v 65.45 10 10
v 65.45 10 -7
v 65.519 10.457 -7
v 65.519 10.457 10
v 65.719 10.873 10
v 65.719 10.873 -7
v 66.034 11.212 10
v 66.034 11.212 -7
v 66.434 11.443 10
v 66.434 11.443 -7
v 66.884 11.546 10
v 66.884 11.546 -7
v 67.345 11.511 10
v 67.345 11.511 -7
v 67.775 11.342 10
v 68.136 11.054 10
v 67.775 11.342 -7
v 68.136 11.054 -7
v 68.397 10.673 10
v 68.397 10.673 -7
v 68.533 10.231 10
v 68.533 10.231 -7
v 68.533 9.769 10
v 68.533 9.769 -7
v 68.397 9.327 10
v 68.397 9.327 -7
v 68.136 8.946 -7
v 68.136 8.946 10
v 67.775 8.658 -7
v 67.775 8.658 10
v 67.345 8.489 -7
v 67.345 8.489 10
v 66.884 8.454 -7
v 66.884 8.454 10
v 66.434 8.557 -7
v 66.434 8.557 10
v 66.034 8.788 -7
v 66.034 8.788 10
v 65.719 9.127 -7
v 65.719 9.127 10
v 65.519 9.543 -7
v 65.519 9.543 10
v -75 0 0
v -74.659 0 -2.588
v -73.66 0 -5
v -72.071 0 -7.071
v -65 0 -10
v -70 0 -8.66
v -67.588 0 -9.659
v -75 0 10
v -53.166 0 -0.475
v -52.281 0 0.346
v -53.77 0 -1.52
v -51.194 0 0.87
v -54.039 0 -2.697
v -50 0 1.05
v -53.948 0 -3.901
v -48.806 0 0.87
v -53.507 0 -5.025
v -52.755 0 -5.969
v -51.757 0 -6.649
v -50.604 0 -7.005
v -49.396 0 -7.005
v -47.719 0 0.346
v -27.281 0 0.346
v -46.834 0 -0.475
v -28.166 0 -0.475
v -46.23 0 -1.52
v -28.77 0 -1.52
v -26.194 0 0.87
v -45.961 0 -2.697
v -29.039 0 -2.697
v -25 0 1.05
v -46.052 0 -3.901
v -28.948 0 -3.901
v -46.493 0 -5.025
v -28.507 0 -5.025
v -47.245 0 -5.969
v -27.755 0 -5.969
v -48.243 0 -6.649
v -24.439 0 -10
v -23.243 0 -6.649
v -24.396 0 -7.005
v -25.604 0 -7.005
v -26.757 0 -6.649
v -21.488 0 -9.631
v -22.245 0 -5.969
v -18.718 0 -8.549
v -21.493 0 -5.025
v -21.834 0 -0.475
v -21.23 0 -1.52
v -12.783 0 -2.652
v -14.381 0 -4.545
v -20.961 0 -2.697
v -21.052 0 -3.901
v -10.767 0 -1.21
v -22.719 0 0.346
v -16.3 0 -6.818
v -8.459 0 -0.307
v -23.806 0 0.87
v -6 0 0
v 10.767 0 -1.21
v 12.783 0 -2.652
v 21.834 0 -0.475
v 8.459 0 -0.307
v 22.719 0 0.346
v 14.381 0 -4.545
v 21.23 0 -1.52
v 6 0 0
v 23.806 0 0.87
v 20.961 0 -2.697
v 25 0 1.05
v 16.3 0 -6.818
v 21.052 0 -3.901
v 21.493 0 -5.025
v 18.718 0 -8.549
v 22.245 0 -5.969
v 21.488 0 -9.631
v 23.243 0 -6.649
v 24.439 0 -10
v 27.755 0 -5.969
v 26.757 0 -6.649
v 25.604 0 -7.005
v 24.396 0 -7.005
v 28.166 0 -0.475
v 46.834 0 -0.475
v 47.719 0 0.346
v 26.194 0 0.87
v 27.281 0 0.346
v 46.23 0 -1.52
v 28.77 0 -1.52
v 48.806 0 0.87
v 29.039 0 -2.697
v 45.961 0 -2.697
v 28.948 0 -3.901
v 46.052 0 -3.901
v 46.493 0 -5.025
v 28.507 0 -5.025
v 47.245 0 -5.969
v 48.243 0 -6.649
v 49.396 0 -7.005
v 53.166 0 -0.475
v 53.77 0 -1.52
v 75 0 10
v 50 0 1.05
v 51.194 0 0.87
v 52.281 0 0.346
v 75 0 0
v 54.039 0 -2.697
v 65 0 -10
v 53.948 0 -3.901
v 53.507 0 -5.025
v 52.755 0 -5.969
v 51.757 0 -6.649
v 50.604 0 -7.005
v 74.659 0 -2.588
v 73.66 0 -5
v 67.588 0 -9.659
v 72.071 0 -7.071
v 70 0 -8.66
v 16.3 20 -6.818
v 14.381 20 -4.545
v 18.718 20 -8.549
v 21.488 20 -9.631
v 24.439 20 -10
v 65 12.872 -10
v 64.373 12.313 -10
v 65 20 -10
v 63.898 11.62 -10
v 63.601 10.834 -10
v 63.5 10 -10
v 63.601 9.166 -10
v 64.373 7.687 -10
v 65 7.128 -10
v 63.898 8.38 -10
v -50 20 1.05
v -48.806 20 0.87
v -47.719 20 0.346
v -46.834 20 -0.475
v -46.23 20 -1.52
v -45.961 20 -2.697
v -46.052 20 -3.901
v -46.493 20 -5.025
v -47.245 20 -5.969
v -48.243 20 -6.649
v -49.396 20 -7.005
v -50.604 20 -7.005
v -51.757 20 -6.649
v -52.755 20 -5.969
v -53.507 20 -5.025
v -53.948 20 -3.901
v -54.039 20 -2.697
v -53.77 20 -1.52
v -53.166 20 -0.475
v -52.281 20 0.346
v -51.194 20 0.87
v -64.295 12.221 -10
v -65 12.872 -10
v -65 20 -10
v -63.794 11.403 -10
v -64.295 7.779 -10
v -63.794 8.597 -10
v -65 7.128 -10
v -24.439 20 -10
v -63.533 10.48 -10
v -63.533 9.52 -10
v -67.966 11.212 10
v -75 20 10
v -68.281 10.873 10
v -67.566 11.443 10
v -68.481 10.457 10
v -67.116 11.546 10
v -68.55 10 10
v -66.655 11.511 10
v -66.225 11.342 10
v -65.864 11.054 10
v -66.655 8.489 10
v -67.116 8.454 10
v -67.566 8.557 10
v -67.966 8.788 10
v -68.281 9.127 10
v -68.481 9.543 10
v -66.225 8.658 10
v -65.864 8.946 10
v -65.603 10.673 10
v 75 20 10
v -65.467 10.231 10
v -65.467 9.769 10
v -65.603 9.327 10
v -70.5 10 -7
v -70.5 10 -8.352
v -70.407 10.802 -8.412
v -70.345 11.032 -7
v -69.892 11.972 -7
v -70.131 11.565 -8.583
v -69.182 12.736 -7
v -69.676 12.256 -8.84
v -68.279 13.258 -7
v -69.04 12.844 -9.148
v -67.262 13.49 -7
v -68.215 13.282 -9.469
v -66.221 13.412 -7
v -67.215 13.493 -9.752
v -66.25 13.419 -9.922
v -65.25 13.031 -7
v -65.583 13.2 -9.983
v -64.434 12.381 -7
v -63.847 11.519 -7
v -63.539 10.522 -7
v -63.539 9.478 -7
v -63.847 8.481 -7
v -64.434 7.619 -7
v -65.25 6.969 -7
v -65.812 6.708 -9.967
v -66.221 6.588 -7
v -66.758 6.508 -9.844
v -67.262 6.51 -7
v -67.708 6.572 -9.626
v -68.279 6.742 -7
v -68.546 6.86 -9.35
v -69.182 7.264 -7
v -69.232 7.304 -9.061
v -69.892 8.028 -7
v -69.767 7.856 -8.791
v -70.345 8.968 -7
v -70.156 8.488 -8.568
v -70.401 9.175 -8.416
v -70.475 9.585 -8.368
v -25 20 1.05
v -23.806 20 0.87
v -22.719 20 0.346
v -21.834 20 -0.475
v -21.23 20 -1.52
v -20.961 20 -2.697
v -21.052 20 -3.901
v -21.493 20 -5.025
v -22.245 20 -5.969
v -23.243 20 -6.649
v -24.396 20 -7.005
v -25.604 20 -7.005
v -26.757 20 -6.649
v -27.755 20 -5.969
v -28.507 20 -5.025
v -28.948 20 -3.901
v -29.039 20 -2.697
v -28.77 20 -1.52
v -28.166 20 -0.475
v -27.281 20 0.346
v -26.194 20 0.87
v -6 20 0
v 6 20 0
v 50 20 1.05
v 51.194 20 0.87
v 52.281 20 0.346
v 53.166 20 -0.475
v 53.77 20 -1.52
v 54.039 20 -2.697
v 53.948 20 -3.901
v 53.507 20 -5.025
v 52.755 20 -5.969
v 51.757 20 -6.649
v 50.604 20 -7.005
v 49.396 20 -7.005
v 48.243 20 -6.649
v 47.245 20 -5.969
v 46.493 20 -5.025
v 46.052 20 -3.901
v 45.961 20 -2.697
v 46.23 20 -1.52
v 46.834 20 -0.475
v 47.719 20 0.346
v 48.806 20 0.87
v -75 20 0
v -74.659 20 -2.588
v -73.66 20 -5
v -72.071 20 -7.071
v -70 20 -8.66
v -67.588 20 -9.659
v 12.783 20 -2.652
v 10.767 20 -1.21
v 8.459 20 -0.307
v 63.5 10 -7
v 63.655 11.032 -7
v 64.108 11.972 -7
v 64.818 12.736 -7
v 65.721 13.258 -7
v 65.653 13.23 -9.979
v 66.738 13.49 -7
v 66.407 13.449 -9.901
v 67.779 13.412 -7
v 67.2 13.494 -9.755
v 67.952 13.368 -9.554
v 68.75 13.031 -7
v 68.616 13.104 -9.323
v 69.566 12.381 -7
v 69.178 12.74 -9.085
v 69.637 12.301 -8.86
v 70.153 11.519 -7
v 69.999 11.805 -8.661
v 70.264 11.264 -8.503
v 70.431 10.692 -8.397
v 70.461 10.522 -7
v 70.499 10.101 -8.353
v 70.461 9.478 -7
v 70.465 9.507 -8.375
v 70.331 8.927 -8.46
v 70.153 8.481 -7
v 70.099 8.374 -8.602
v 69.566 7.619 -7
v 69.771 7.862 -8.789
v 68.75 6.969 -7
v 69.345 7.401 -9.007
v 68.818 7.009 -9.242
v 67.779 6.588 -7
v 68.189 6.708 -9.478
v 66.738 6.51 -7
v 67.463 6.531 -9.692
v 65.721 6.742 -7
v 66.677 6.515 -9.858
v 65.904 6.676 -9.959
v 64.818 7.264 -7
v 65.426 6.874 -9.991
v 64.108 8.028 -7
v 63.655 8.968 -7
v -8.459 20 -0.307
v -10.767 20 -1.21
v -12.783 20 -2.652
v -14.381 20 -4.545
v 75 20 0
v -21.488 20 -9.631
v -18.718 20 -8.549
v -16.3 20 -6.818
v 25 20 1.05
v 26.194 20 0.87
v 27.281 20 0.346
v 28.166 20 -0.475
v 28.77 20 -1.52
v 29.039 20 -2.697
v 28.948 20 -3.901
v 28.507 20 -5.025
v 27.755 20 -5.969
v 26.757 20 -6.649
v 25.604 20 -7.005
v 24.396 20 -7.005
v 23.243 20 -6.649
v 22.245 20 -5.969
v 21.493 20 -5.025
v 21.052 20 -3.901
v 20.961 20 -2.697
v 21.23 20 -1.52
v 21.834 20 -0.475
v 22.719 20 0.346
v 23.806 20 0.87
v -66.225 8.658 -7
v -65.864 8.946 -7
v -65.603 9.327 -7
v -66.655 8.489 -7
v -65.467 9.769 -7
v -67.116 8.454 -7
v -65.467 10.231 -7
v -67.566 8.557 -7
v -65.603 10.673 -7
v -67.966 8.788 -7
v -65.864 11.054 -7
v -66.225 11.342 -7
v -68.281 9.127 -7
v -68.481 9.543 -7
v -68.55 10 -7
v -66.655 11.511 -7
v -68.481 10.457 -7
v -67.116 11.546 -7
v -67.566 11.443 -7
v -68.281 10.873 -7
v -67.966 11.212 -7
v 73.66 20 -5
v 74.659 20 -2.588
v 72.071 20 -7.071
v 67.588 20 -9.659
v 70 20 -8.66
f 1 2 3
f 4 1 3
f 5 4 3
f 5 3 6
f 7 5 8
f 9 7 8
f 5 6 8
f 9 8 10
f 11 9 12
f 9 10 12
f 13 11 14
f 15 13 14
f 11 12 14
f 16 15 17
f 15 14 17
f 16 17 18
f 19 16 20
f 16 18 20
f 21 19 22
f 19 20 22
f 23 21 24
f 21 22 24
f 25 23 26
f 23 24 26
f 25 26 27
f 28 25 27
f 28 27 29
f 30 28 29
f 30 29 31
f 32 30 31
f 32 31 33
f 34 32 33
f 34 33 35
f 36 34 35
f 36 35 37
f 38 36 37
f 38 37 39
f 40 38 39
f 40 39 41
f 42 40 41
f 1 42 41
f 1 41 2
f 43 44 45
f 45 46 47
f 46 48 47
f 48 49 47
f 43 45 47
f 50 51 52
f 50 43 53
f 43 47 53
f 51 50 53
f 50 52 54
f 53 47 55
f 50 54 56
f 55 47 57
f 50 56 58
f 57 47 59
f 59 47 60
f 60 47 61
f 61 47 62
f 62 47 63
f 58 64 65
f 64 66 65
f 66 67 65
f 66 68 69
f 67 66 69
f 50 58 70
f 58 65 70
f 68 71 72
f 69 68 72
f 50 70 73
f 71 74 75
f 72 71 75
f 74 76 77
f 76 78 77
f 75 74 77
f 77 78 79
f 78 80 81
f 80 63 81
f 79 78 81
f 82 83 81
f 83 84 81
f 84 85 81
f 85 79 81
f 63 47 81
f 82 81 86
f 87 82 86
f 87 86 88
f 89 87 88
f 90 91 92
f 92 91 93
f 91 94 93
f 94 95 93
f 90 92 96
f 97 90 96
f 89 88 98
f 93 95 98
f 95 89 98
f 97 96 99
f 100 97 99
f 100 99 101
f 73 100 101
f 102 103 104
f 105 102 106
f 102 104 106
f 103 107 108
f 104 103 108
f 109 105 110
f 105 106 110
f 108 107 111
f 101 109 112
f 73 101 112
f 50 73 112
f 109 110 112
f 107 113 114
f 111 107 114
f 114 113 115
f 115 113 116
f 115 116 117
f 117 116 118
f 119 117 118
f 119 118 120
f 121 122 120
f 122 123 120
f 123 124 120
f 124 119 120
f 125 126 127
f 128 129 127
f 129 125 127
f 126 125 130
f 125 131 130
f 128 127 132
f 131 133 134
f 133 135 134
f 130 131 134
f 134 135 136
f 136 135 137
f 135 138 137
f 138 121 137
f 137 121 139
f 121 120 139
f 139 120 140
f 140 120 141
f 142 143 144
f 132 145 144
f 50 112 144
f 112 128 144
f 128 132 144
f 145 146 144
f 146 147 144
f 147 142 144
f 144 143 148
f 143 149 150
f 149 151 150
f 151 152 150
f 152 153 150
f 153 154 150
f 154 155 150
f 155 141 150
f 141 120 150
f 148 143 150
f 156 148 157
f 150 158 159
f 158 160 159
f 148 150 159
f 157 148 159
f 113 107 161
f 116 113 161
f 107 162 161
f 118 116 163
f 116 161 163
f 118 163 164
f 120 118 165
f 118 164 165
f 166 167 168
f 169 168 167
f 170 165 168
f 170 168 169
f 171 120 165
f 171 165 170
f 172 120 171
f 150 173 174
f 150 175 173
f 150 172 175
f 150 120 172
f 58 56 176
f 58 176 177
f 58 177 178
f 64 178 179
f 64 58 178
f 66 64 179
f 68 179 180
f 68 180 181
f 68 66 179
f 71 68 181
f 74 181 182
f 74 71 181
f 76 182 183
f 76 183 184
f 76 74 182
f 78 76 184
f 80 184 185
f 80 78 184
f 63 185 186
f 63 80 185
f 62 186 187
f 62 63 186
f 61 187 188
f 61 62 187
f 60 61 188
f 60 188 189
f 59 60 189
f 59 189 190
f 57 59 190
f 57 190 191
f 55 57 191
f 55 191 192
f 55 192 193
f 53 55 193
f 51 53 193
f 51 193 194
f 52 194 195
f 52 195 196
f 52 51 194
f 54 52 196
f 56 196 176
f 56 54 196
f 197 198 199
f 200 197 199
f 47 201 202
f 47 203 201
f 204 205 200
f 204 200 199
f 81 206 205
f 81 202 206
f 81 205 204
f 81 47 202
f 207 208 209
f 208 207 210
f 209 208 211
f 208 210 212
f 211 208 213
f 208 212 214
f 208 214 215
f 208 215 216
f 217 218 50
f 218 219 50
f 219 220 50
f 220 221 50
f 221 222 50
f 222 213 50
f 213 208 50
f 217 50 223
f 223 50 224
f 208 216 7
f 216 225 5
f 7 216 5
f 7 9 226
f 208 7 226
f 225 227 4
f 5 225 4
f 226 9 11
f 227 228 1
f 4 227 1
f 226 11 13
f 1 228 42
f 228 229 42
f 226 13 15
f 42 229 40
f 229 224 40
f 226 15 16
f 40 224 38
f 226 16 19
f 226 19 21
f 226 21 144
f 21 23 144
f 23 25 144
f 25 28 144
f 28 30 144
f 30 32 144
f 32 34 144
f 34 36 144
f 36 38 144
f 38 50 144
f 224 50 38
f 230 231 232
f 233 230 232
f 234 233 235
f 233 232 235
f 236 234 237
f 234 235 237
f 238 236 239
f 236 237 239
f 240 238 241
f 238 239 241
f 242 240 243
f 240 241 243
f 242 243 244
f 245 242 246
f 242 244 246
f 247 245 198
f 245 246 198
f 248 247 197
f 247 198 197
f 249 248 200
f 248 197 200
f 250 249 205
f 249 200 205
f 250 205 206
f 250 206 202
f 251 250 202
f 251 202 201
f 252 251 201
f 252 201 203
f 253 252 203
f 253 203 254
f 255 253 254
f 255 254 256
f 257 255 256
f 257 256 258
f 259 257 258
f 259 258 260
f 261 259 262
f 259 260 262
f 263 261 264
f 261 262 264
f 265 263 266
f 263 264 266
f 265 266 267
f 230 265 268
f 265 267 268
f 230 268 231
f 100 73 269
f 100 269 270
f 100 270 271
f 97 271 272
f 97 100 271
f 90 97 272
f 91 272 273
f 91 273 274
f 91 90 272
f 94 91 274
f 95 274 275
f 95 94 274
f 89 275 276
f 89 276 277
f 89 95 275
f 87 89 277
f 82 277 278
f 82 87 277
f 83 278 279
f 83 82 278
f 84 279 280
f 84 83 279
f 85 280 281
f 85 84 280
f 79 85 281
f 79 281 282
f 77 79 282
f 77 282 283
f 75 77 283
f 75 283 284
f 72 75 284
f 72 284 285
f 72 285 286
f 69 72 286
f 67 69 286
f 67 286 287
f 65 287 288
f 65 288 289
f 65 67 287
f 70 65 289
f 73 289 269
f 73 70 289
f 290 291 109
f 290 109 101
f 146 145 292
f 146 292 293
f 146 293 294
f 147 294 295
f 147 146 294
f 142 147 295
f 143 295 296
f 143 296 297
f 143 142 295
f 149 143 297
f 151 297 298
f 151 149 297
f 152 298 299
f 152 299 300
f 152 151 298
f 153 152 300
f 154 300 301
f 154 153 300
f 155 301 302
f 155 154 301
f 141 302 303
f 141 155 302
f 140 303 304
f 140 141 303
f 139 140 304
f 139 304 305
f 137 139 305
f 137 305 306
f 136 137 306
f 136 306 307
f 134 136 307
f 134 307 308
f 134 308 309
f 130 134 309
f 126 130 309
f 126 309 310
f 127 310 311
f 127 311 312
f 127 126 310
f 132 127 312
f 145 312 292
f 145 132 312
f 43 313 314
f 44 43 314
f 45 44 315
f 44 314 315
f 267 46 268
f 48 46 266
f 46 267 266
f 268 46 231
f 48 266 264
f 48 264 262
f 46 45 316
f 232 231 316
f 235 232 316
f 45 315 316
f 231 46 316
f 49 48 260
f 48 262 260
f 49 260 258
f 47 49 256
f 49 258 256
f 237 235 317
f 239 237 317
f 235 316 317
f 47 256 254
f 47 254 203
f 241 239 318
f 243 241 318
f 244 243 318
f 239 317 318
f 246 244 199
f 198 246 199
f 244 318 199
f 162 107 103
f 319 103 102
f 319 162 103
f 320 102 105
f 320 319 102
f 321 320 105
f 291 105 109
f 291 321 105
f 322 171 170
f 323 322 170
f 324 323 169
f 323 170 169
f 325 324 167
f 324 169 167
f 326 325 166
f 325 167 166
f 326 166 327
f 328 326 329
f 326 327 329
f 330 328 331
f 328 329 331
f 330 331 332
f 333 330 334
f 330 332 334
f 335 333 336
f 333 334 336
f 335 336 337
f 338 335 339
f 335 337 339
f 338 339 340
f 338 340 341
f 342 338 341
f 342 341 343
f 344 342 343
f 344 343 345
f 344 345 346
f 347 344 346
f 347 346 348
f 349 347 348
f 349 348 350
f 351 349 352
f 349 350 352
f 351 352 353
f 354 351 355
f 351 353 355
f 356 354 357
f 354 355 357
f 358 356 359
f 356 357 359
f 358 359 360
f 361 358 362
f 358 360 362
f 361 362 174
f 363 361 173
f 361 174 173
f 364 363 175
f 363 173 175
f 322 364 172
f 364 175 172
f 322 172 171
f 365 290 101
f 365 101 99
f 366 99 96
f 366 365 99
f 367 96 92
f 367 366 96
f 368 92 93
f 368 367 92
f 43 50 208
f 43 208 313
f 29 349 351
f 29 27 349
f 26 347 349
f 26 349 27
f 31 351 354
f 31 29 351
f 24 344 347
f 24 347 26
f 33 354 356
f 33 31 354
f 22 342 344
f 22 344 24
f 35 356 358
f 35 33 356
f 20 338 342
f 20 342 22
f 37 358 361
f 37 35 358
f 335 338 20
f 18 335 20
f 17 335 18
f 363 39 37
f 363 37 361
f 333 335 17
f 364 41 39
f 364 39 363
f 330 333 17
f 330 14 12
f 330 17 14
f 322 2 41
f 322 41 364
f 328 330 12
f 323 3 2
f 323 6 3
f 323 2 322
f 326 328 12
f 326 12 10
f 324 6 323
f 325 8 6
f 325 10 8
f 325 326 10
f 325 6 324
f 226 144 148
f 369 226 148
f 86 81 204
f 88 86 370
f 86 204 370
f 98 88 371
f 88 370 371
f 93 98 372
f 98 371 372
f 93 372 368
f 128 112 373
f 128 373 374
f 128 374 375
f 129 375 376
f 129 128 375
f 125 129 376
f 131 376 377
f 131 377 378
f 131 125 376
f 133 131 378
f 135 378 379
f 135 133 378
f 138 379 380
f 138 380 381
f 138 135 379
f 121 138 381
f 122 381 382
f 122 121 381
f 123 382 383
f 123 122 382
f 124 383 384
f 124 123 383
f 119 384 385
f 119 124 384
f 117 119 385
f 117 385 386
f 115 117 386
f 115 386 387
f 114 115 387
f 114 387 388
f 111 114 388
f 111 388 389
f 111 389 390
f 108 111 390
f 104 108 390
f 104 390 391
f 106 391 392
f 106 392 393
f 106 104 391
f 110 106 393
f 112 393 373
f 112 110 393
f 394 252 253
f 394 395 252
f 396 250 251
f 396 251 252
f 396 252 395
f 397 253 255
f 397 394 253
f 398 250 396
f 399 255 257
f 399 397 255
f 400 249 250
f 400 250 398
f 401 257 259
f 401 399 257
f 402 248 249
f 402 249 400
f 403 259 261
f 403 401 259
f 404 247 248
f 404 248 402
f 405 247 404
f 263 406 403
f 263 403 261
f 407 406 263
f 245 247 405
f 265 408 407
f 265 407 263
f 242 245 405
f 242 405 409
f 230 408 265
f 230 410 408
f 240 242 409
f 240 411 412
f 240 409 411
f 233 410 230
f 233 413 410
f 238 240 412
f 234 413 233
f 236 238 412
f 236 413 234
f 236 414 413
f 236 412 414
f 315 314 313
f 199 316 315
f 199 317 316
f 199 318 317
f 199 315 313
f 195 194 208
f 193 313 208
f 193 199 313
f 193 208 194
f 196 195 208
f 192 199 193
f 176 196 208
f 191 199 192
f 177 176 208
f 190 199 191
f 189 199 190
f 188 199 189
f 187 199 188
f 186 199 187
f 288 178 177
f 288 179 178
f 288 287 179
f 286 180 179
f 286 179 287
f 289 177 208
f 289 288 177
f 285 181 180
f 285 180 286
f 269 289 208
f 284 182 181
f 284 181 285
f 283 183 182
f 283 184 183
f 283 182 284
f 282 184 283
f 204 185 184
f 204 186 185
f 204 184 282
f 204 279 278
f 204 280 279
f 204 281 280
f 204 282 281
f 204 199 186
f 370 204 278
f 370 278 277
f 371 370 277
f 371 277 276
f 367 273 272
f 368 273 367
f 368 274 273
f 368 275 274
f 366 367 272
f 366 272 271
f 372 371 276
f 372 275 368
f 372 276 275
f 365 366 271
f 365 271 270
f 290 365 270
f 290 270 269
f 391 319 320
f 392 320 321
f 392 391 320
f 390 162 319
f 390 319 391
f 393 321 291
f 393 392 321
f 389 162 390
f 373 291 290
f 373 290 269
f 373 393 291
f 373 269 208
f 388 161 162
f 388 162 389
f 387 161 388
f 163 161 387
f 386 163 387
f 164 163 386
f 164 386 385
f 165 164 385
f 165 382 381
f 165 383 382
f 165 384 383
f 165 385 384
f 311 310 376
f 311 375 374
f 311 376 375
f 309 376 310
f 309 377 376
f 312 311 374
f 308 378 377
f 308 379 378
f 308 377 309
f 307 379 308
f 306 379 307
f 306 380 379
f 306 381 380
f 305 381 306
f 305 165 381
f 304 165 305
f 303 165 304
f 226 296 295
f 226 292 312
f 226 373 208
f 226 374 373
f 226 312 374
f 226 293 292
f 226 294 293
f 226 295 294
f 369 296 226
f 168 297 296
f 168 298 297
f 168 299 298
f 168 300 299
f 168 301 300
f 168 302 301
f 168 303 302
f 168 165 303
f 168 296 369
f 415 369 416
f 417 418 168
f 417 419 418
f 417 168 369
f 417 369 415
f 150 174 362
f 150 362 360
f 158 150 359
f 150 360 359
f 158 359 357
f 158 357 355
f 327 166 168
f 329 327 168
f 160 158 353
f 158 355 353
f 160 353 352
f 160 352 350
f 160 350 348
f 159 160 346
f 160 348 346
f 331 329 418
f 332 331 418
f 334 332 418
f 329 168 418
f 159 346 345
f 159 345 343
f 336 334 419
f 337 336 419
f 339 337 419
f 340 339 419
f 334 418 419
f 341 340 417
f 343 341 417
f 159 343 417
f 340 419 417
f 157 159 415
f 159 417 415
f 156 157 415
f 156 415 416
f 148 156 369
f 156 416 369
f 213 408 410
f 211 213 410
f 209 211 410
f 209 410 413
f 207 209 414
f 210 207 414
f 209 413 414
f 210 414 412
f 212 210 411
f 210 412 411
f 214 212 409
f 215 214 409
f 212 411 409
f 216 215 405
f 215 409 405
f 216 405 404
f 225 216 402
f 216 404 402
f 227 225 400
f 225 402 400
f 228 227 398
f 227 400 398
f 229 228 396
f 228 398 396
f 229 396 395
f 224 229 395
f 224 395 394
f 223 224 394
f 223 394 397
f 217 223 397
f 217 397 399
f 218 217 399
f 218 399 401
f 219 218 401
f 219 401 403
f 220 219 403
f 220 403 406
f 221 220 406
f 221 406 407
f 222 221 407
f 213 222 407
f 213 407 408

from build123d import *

# Parameters (mm, degrees)
SKETCH1_W           = 150
SKETCH1_H           = 20
SKETCH1_R           = 4.05
BOSS_EXTRUDE1_DEPTH = 20
FILLET1_R           = 10
SKETCH3_R           = 1.55
CUT_EXTRUDE1_DEPTH  = 81.156097709
SKETCH3_3_R         = 3.5
SKETCH3_3_R_2       = 1.55
CUT_EXTRUDE2_DEPTH  = 3
CUT_EXTRUDE3_DEPTH  = 79.262379347
FILLET2_R           = 12


with BuildPart() as part:
    # Sketch1 → Boss-Extrude1 (new body)
    with BuildSketch(Plane(origin=(0, 0, 0), x_dir=(1, 0, 0), z_dir=(0, 1, 0))):
        Rectangle(SKETCH1_W, SKETCH1_H)
        with Locations((-25, 3)):
            Circle(SKETCH1_R, mode=Mode.SUBTRACT)
        with Locations((25, 3)):
            Circle(SKETCH1_R, mode=Mode.SUBTRACT)
        with Locations((-50, 3)):
            Circle(SKETCH1_R, mode=Mode.SUBTRACT)
        with Locations((50, 3)):
            Circle(SKETCH1_R, mode=Mode.SUBTRACT)
    extrude(amount=BOSS_EXTRUDE1_DEPTH)

    # Fillet1
    fillet1_edges = [part.edges().sort_by_distance(p)[0] for p in [
        (75, 10, -10),
        (-75, 10, -10),
    ]]
    fillet(fillet1_edges, radius=FILLET1_R)

    # Sketch3 → Cut-Extrude1 (cut, through all)
    with BuildSketch(Plane(origin=(0, 0, -10), x_dir=(-1, 0, 0), z_dir=(0, 0, -1))):
        with Locations((-67, 10)):
            Circle(SKETCH3_R)
        with Locations((67, 10)):
            Circle(SKETCH3_R)
    extrude(amount=-CUT_EXTRUDE1_DEPTH, mode=Mode.SUBTRACT)

    # Sketch3<3> → Cut-Extrude2 (cut)
    # profile 1 of 2: a face of its own
    with BuildSketch(Plane(origin=(0, 0, -10), x_dir=(-1, 0, 0), z_dir=(0, 0, -1))):
        with Locations((-67, 10)):
            Circle(SKETCH3_3_R)
        with Locations((-67, 10)):
            Circle(SKETCH3_3_R_2, mode=Mode.SUBTRACT)
    # profile 2 of 2: a face of its own
    with BuildSketch(Plane(origin=(0, 0, -10), x_dir=(-1, 0, 0), z_dir=(0, 0, -1))):
        with Locations((67, 10)):
            Circle(SKETCH3_3_R)
        with Locations((67, 10)):
            Circle(SKETCH3_3_R_2, mode=Mode.SUBTRACT)
    extrude(amount=-CUT_EXTRUDE2_DEPTH, mode=Mode.SUBTRACT)

    # Sketch4 → Cut-Extrude3 (cut, through all)
    with BuildSketch(Plane(origin=(0, 20, 0), x_dir=(1, 0, 0), z_dir=(0, 1, 0))):
        with BuildLine():
            Line((-6, 20), (6, 20))
            ThreePointArc((6, 20), (16, 10), (6, 0))
            Line((6, 0), (-6, 0))
            ThreePointArc((-6, 0), (-16, 10), (-6, 20))
        make_face()
    extrude(amount=-CUT_EXTRUDE3_DEPTH, mode=Mode.SUBTRACT)

    # Fillet2
    fillet2_edges = [part.edges().sort_by_distance(p)[0] for p in [
        (16, 10, -10),
        (-16, 10, -10),
    ]]
    fillet(fillet2_edges, radius=FILLET2_R)


solid = part.part
